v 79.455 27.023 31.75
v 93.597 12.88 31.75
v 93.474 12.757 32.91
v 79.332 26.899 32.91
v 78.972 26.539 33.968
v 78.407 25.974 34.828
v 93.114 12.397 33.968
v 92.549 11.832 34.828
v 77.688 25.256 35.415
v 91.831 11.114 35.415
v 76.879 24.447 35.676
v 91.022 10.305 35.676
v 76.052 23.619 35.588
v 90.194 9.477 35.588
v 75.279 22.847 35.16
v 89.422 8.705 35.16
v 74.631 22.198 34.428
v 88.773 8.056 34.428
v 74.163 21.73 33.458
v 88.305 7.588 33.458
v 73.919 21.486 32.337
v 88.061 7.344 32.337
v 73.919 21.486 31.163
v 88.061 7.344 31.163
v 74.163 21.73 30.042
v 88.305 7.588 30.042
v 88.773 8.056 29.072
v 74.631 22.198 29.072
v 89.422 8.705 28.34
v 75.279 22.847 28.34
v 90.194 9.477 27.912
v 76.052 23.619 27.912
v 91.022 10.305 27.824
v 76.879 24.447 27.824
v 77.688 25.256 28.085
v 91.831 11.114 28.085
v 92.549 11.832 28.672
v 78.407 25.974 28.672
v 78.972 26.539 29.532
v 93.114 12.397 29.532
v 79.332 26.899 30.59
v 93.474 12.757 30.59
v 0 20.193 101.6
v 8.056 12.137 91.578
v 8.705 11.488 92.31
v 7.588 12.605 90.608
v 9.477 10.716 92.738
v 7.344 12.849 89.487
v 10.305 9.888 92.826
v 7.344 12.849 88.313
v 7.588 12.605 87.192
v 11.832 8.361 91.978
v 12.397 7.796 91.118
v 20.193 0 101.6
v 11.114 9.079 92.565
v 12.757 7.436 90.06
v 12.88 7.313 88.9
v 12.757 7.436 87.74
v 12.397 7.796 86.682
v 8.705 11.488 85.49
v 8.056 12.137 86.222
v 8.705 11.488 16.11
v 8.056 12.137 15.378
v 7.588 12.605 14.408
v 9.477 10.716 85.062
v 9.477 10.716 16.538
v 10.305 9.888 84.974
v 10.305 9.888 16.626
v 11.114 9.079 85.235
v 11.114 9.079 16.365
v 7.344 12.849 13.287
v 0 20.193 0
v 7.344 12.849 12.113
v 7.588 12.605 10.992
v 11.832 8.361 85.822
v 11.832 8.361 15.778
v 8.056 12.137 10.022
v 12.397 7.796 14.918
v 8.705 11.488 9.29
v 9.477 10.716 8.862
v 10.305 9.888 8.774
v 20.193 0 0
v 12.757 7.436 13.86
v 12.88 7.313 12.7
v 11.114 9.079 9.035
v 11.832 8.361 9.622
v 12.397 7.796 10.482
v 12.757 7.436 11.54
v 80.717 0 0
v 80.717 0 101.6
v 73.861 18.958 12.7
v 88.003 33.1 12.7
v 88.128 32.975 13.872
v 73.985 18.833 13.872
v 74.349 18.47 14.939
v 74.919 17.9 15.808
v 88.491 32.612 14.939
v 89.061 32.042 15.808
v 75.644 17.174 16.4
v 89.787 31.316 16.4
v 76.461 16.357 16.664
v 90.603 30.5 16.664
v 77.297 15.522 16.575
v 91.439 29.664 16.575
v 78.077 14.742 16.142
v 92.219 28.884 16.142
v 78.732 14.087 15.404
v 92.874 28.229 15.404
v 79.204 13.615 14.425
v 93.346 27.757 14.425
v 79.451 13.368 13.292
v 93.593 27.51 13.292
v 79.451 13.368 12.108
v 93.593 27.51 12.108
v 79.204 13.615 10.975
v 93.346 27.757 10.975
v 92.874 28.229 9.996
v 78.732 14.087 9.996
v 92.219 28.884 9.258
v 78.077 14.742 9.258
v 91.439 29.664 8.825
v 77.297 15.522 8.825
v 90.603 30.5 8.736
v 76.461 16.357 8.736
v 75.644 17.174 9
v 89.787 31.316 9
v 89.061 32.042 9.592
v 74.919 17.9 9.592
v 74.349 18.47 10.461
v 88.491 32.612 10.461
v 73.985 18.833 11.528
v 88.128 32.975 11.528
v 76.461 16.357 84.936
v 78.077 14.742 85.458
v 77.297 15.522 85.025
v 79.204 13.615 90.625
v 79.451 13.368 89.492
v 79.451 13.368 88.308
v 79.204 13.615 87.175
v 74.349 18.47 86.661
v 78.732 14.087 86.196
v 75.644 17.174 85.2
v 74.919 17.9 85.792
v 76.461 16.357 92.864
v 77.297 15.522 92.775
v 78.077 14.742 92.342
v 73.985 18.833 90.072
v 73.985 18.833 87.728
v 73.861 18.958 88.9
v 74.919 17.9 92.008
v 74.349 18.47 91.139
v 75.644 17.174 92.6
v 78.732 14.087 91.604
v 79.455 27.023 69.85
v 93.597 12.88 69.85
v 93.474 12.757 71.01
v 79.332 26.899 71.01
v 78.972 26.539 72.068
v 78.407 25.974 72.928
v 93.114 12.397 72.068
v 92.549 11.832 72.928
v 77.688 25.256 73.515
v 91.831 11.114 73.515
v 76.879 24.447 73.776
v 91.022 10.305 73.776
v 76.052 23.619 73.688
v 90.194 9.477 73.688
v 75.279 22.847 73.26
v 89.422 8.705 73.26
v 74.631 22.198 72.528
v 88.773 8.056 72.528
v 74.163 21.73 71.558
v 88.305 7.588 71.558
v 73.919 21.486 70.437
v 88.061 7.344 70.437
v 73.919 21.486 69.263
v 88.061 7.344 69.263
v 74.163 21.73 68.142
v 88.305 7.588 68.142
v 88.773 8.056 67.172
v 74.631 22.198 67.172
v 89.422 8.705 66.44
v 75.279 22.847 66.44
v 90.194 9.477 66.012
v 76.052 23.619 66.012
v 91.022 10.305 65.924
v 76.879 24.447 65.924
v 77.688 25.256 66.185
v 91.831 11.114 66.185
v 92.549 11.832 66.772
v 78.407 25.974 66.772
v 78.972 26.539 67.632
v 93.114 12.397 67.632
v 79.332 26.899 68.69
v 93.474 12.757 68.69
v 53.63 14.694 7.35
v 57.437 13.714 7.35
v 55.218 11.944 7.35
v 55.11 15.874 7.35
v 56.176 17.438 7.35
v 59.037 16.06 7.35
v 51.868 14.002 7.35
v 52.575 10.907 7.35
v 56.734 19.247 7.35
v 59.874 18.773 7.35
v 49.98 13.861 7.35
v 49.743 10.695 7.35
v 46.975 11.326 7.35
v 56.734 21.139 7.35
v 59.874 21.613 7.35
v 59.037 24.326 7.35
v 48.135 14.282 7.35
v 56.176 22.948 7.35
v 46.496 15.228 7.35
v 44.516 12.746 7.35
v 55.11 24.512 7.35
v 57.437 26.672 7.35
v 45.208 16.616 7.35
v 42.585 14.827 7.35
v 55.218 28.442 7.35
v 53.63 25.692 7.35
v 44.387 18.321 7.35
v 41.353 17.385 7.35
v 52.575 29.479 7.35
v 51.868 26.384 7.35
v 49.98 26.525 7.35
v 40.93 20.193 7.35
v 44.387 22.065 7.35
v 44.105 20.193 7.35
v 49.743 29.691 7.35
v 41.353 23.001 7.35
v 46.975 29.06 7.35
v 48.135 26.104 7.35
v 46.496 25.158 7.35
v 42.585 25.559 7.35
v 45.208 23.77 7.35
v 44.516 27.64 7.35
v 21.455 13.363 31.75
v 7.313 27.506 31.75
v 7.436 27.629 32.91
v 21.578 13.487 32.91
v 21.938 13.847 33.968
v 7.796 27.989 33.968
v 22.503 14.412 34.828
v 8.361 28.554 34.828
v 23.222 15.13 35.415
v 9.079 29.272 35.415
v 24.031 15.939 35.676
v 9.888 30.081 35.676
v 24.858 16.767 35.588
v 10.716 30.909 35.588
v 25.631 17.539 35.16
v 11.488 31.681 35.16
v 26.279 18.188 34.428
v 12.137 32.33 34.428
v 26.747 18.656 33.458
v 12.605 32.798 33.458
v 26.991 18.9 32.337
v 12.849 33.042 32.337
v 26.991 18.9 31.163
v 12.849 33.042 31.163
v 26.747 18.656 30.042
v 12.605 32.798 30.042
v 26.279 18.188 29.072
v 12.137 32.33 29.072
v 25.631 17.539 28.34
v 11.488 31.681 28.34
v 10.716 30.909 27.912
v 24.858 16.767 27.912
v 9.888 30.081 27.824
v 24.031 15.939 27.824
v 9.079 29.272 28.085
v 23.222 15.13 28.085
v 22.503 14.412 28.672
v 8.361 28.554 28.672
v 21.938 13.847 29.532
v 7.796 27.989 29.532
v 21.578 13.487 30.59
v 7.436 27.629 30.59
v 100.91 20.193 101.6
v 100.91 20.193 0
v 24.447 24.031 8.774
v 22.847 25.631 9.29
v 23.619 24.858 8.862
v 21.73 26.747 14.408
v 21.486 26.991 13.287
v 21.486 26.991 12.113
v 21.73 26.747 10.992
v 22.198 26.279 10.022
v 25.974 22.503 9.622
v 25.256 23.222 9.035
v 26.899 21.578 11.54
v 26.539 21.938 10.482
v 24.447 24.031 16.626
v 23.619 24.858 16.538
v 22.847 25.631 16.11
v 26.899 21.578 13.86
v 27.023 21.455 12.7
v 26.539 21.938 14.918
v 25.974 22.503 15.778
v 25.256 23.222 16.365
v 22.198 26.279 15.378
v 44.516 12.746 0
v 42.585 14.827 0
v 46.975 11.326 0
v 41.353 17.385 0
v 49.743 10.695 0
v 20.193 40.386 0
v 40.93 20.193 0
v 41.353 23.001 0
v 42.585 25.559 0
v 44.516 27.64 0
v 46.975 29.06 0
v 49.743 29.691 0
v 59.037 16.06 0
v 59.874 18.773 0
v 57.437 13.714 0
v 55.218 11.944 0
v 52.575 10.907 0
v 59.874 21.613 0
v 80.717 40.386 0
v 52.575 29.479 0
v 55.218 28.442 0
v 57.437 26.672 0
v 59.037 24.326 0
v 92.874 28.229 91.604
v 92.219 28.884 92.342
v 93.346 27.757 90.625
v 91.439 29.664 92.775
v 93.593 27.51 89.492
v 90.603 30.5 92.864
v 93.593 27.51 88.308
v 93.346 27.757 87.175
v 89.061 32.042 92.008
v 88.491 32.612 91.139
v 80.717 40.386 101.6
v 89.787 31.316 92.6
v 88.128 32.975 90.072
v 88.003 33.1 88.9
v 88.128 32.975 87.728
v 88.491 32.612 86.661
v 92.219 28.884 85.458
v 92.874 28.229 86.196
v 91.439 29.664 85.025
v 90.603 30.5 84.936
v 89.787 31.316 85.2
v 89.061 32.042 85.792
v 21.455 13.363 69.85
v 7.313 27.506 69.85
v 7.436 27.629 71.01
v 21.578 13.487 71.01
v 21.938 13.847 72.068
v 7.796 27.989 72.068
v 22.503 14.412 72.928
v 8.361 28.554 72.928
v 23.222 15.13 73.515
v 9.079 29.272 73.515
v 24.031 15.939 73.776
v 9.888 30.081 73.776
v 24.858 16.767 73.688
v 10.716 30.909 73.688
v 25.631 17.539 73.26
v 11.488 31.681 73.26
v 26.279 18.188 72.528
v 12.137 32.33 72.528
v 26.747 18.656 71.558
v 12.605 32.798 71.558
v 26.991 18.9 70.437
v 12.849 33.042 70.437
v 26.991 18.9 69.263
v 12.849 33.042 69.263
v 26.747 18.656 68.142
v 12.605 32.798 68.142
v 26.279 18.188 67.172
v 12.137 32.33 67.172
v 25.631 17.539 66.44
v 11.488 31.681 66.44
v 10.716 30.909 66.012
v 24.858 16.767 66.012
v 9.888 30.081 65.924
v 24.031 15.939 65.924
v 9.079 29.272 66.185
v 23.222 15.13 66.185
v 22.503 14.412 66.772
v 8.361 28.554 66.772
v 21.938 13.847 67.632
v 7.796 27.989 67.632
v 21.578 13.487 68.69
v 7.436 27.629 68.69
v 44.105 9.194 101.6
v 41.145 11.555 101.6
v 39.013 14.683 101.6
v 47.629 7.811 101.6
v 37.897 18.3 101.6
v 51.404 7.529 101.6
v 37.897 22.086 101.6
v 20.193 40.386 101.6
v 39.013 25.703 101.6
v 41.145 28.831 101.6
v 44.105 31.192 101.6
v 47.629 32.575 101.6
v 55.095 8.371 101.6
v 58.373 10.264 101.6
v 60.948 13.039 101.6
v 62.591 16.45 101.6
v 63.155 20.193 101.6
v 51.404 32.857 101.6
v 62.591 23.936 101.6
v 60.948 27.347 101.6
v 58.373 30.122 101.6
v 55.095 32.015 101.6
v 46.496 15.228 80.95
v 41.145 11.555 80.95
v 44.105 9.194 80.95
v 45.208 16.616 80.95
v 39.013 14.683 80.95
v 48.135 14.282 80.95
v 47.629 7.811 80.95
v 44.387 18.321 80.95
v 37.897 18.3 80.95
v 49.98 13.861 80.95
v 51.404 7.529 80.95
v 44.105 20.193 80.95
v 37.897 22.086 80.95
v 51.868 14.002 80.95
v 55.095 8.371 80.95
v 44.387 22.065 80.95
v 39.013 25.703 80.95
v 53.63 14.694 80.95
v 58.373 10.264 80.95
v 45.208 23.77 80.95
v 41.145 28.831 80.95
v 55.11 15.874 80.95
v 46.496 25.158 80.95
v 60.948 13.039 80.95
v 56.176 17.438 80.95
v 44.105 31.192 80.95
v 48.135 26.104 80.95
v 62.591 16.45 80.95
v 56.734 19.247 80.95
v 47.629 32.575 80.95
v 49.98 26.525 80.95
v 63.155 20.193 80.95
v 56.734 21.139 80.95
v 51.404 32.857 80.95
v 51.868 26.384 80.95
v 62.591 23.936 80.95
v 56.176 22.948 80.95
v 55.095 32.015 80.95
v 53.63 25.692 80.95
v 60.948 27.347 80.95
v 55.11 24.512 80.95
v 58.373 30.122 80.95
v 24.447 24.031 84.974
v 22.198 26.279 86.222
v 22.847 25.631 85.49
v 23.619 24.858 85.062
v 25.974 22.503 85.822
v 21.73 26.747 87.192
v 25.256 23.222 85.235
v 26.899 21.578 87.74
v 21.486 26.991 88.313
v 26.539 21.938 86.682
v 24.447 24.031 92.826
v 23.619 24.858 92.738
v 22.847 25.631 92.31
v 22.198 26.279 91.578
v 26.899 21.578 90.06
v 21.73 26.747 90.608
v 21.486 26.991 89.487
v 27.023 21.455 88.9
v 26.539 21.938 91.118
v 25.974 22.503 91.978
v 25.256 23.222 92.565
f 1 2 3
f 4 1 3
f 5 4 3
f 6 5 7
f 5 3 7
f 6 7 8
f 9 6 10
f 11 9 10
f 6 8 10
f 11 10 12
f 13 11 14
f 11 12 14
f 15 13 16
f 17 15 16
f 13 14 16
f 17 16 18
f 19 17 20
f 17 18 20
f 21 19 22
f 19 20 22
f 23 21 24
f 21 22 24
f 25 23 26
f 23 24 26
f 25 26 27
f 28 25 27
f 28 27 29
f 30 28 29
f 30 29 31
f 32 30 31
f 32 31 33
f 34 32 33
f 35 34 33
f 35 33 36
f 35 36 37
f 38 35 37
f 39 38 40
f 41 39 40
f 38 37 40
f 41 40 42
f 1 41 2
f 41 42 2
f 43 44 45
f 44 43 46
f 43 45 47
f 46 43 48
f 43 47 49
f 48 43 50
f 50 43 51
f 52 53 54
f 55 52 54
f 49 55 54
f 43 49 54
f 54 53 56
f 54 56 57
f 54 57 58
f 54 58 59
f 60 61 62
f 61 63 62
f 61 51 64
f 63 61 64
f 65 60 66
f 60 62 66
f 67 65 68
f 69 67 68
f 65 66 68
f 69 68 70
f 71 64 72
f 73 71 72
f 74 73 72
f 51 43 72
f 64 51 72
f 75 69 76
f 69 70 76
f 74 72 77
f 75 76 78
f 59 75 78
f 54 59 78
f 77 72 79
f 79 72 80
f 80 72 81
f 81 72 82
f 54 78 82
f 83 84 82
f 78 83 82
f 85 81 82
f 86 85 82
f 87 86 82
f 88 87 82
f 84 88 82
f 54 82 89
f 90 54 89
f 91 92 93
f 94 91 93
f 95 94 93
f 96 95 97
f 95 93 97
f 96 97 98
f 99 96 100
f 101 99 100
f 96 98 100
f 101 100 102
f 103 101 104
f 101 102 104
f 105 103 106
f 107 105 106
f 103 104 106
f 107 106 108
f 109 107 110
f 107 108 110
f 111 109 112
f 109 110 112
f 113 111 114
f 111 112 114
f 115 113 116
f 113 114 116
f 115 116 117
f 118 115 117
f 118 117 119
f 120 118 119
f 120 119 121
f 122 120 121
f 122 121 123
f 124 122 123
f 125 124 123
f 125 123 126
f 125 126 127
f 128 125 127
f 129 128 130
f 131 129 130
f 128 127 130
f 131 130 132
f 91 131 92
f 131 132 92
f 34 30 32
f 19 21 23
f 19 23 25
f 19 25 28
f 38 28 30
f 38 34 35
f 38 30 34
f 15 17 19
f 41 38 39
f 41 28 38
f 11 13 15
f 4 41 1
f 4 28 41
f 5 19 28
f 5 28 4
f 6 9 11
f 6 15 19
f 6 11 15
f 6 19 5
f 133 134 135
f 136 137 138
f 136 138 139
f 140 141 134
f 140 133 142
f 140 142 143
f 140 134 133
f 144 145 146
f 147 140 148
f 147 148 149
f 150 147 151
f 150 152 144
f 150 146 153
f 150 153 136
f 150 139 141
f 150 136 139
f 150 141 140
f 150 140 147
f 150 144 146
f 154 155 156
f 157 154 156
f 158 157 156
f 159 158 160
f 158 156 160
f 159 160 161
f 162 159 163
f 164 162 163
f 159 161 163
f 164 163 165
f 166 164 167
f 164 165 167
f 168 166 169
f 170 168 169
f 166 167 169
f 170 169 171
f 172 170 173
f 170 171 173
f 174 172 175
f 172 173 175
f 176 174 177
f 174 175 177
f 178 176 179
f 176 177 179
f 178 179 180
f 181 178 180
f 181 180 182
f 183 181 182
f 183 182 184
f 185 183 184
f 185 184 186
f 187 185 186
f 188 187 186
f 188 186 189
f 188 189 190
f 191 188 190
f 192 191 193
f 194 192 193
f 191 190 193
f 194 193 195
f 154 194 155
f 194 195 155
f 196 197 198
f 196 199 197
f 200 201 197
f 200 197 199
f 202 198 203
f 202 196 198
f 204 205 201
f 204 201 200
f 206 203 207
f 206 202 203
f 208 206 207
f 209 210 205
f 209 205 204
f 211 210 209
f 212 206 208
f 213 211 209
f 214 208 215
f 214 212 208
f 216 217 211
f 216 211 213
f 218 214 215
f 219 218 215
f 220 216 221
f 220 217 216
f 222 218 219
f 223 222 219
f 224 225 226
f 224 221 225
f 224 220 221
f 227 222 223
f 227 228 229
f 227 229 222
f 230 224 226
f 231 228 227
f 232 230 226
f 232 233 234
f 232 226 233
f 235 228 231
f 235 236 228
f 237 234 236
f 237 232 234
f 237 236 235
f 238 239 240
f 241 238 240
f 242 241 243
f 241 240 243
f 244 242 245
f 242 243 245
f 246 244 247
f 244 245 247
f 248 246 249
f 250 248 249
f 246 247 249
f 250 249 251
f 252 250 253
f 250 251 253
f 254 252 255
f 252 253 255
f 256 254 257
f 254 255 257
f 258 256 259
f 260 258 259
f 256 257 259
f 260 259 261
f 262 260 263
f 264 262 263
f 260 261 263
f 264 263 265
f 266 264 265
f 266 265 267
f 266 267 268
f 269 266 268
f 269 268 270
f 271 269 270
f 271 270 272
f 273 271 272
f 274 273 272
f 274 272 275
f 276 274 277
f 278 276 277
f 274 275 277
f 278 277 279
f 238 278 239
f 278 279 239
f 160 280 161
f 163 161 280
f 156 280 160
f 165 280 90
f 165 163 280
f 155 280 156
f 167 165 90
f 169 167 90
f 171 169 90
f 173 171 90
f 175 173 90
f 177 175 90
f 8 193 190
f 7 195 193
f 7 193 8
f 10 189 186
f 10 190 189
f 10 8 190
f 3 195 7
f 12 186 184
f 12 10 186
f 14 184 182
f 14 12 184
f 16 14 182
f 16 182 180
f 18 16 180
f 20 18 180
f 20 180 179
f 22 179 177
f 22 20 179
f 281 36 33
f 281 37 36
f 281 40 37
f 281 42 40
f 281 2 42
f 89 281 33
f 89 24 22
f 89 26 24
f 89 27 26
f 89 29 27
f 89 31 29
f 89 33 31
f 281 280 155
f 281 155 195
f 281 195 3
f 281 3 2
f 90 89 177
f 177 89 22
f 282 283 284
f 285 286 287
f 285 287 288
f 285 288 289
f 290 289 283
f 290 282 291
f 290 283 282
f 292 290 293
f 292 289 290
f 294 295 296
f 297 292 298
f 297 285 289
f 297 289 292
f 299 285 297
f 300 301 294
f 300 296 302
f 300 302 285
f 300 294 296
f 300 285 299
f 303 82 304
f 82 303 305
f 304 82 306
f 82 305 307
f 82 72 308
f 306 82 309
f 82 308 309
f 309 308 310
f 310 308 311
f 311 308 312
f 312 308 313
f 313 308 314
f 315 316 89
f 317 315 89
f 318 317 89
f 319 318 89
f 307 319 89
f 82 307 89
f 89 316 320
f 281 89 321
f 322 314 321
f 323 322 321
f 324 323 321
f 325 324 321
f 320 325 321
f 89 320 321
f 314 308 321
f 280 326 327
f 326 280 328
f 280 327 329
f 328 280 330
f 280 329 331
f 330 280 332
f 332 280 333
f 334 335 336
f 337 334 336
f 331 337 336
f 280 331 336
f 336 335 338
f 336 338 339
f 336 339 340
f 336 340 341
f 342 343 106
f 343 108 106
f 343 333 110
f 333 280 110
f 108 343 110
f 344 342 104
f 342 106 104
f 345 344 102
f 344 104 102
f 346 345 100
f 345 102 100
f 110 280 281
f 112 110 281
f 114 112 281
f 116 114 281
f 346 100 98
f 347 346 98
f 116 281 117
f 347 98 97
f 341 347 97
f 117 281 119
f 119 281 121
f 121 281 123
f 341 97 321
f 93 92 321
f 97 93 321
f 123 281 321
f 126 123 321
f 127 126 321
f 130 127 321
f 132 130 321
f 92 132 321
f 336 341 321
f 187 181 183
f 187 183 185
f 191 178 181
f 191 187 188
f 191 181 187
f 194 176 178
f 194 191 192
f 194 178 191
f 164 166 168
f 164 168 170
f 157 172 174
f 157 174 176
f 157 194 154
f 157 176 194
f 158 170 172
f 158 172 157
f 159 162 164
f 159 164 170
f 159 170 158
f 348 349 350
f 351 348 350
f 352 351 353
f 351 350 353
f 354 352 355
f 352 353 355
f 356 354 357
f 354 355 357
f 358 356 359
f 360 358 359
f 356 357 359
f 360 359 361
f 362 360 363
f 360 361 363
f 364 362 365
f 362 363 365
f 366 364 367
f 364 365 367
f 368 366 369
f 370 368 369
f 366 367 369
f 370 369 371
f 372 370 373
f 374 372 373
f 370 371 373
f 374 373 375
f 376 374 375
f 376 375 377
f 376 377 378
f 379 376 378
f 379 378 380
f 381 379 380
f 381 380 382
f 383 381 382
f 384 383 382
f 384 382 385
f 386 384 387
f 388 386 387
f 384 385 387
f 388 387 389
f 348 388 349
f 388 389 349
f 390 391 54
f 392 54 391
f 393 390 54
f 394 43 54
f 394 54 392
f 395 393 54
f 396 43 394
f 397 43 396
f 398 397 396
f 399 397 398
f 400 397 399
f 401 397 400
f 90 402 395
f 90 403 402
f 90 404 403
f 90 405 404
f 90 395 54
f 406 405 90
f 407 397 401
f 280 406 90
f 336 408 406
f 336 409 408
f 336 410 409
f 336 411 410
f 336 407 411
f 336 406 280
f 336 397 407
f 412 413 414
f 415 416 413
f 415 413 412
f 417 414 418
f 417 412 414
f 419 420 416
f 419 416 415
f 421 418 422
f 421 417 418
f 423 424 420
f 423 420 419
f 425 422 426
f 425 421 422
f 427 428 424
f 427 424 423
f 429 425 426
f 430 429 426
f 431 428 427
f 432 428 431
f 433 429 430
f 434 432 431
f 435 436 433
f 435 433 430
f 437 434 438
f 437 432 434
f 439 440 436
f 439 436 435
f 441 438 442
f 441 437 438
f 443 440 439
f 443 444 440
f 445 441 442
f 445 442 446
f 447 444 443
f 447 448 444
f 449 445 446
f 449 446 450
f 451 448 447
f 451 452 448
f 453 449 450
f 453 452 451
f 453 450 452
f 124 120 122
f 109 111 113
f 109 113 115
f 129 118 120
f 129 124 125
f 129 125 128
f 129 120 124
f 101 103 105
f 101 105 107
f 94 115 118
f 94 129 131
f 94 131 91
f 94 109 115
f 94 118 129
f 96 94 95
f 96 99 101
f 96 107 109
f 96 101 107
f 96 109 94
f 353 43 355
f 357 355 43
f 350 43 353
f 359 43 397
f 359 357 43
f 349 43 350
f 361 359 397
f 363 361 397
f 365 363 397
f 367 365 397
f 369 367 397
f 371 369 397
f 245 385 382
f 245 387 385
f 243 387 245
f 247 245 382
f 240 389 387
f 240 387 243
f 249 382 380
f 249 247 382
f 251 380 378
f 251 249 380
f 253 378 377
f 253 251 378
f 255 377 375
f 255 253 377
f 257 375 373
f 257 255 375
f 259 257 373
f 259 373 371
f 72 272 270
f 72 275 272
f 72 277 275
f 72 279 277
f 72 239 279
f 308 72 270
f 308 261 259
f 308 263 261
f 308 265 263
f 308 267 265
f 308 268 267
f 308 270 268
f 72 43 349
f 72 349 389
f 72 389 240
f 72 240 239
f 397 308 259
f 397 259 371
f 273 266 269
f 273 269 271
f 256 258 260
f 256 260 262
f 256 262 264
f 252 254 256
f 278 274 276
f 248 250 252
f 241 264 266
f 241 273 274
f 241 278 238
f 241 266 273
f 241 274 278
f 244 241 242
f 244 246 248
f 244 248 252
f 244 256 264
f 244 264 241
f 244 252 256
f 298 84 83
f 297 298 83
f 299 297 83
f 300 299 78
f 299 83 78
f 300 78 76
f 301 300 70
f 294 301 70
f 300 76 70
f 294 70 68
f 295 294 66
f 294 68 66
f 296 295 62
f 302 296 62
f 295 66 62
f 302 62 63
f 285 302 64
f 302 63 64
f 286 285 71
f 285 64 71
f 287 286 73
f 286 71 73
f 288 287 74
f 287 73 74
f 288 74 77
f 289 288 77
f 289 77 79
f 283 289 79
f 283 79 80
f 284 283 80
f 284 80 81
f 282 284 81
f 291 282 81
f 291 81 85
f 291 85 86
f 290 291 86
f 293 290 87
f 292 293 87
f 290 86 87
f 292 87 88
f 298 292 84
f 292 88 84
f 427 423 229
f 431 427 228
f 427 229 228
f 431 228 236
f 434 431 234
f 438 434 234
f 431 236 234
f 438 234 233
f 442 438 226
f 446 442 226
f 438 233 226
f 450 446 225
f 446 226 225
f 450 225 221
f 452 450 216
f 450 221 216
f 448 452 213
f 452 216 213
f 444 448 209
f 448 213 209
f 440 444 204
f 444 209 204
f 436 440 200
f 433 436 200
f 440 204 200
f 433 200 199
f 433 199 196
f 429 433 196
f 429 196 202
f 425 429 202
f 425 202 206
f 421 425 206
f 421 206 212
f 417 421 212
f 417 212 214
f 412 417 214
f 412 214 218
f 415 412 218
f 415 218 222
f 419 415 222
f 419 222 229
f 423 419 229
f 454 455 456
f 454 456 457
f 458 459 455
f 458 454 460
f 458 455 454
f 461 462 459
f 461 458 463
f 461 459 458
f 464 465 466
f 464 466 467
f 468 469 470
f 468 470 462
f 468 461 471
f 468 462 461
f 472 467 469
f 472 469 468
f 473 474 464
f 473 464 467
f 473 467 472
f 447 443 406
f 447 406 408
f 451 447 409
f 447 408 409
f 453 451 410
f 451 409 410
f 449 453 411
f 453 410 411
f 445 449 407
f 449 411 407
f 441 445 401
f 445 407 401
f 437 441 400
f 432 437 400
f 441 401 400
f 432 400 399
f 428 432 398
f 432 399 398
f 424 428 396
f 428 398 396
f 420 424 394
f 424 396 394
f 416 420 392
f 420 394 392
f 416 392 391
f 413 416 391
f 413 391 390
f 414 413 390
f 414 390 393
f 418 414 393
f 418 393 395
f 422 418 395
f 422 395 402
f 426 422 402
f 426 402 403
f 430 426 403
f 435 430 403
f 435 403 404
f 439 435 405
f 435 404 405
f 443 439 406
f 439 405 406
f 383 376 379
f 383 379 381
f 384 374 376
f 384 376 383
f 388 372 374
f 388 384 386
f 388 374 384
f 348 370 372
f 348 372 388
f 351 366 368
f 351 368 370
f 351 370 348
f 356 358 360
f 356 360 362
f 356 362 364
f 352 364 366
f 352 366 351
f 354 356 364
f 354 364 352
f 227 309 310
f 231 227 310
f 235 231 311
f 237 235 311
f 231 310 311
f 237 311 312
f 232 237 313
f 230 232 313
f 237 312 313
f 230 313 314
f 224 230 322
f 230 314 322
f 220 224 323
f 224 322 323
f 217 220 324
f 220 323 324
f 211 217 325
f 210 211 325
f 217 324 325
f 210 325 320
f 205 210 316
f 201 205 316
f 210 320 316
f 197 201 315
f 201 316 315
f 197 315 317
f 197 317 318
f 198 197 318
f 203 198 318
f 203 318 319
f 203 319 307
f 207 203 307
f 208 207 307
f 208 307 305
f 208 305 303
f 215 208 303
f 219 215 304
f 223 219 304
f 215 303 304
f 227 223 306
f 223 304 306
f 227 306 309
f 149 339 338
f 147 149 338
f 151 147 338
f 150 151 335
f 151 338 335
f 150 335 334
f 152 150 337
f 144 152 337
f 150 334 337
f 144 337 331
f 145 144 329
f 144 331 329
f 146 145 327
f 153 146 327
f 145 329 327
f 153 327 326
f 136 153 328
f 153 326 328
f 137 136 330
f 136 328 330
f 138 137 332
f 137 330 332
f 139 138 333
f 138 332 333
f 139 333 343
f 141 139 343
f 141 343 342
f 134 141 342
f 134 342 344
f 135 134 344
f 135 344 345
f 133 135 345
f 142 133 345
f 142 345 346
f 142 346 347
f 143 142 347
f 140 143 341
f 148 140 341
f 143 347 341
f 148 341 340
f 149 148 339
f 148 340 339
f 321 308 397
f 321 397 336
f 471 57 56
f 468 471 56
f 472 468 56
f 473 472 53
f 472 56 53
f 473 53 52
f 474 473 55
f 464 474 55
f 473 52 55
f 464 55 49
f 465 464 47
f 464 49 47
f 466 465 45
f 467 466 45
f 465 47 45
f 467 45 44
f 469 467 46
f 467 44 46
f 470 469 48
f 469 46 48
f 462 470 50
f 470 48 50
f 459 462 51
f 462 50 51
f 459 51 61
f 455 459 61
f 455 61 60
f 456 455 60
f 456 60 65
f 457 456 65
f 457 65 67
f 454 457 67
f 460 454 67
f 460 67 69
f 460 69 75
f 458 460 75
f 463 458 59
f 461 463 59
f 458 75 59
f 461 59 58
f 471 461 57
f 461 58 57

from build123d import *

# Parameters (mm, degrees)
ESQUISSE1_W             = 100.91
ESQUISSE1_H             = 40.386
BOSS_EXTRU_1_DEPTH      = 101.6
ENL_V_MAT_EXTRU_1_DEPTH = 101.6
ENL_V_MAT_EXTRU_2_DEPTH = 149.783121005
ESQUISSE5_R             = 3.975
ENL_V_MAT_EXTRU_3_DEPTH = 20
ESQUISSE6_R             = 3.937
ENL_V_MAT_EXTRU_4_DEPTH = 20
ESQUISSE7_R             = 3.937
ENL_V_MAT_EXTRU_5_DEPTH = 20
ESQUISSE8_R             = 3.937
ENL_V_MAT_EXTRU_6_DEPTH = 20
ESQUISSE9_R             = 6.35
ENL_V_MAT_EXTRU_7_DEPTH = 149.783121005
ESQUISSE10_R            = 9.525
ENL_V_MAT_EXTRU_8_DEPTH = 7.35
ESQUISSE11_R            = 12.7
ENL_V_MAT_EXTRU_9_DEPTH = 20.65


with BuildPart() as part:
    # Esquisse1 → Boss.-Extru.1 (new body)
    with BuildSketch(Plane.XY):
        with Locations((50.455, 20.193)):
            Rectangle(ESQUISSE1_W, ESQUISSE1_H)
    extrude(amount=BOSS_EXTRU_1_DEPTH)

    # Esquisse3 → Enlèv. mat.-Extru.1 (cut)
    with BuildSketch(Plane(origin=(0, 0, 0), x_dir=(-1, 0, 0), z_dir=(0, 0, -1))):
        Polygon((-100.91, 20.193), (-80.717, 0), (-100.91, 0), align=None)
        Polygon((0, 0), (0, 20.193), (-20.193, 0), align=None)
    extrude(amount=-ENL_V_MAT_EXTRU_1_DEPTH, mode=Mode.SUBTRACT)

    # Esquisse4 → Enlèv. mat.-Extru.2 (cut, through all)
    with BuildSketch(Plane(origin=(0, 0, 0), x_dir=(-1, 0, 0), z_dir=(0, 0, -1))):
        Polygon((-100.91, 20.193), (-80.717, 40.386), (-100.91, 40.386), align=None)
        Polygon((0, 40.386), (0, 20.193), (-20.193, 40.386), align=None)
    extrude(amount=-ENL_V_MAT_EXTRU_2_DEPTH, mode=Mode.SUBTRACT)

    # Esquisse5 → Enlèv. mat.-Extru.3 (cut)
    with BuildSketch(Plane(origin=(60.5515, 60.5515, 0), x_dir=(0, 0, -1), z_dir=(0.7071067811865488, 0.7071067811865464, 0))):
        with Locations(Location((-88.9, -42.796930825, 0), (0, 0, 90))):
            Circle(ESQUISSE5_R)
        with Locations(Location((-12.7, -42.796930825, 0), (0, 0, 90))):
            Circle(ESQUISSE5_R)
    extrude(amount=-ENL_V_MAT_EXTRU_3_DEPTH, mode=Mode.SUBTRACT)

    # Esquisse6 → Enlèv. mat.-Extru.4 (cut)
    with BuildSketch(Plane(origin=(10.0965, 10.0965, 0), x_dir=(0, 0, 1), z_dir=(-0.7071067811865475, -0.7071067811865476, 0))):
        with Locations(Location((12.7, 0, 0), (0, 0, 270))):
            Circle(ESQUISSE6_R)
        with Locations(Location((88.9, 0, 0), (0, 0, 270))):
            Circle(ESQUISSE6_R)
    extrude(amount=-ENL_V_MAT_EXTRU_4_DEPTH, mode=Mode.SUBTRACT)

    # Esquisse7 → Enlèv. mat.-Extru.5 (cut)
    with BuildSketch(Plane(origin=(-10.0965, 10.0965, 0), x_dir=(0, 0, 1), z_dir=(-0.7071067811865488, 0.7071067811865464, 0))):
        with Locations(Location((31.75, 28.557214465, 0), (0, 0, 270))):
            Circle(ESQUISSE7_R)
        with Locations(Location((69.85, 28.557214465, 0), (0, 0, 270))):
            Circle(ESQUISSE7_R)
    extrude(amount=-ENL_V_MAT_EXTRU_5_DEPTH, mode=Mode.SUBTRACT)

    # Esquisse8 → Enlèv. mat.-Extru.6 (cut)
    with BuildSketch(Plane(origin=(40.3585, -40.3585, 0), x_dir=(0, 0, -1), z_dir=(0.7071067811865475, -0.7071067811865476, 0))):
        with Locations(Location((-69.85, 71.35414529, 0), (0, 0, 90))):
            Circle(ESQUISSE8_R)
        with Locations(Location((-31.75, 71.35414529, 0), (0, 0, 90))):
            Circle(ESQUISSE8_R)
    extrude(amount=-ENL_V_MAT_EXTRU_6_DEPTH, mode=Mode.SUBTRACT)

    # Esquisse9 → Enlèv. mat.-Extru.7 (cut, through all)
    with BuildSketch(Plane(origin=(0, 0, 0), x_dir=(-1, 0, 0), z_dir=(0, 0, -1))):
        with Locations((-50.455, 20.193)):
            Circle(ESQUISSE9_R)
    extrude(amount=-ENL_V_MAT_EXTRU_7_DEPTH, mode=Mode.SUBTRACT)

    # Esquisse10 → Enlèv. mat.-Extru.8 (cut)
    with BuildSketch(Plane(origin=(0, 0, 0), x_dir=(-1, 0, 0), z_dir=(0, 0, -1))):
        with Locations((-50.455, 20.193)):
            Circle(ESQUISSE10_R)
    extrude(amount=-ENL_V_MAT_EXTRU_8_DEPTH, mode=Mode.SUBTRACT)

    # Esquisse11 → Enlèv. mat.-Extru.9 (cut)
    with BuildSketch(Plane.XY.offset(101.6)):
        with Locations((50.455, 20.193)):
            Circle(ESQUISSE11_R)
    extrude(amount=-ENL_V_MAT_EXTRU_9_DEPTH, mode=Mode.SUBTRACT)


solid = part.part
